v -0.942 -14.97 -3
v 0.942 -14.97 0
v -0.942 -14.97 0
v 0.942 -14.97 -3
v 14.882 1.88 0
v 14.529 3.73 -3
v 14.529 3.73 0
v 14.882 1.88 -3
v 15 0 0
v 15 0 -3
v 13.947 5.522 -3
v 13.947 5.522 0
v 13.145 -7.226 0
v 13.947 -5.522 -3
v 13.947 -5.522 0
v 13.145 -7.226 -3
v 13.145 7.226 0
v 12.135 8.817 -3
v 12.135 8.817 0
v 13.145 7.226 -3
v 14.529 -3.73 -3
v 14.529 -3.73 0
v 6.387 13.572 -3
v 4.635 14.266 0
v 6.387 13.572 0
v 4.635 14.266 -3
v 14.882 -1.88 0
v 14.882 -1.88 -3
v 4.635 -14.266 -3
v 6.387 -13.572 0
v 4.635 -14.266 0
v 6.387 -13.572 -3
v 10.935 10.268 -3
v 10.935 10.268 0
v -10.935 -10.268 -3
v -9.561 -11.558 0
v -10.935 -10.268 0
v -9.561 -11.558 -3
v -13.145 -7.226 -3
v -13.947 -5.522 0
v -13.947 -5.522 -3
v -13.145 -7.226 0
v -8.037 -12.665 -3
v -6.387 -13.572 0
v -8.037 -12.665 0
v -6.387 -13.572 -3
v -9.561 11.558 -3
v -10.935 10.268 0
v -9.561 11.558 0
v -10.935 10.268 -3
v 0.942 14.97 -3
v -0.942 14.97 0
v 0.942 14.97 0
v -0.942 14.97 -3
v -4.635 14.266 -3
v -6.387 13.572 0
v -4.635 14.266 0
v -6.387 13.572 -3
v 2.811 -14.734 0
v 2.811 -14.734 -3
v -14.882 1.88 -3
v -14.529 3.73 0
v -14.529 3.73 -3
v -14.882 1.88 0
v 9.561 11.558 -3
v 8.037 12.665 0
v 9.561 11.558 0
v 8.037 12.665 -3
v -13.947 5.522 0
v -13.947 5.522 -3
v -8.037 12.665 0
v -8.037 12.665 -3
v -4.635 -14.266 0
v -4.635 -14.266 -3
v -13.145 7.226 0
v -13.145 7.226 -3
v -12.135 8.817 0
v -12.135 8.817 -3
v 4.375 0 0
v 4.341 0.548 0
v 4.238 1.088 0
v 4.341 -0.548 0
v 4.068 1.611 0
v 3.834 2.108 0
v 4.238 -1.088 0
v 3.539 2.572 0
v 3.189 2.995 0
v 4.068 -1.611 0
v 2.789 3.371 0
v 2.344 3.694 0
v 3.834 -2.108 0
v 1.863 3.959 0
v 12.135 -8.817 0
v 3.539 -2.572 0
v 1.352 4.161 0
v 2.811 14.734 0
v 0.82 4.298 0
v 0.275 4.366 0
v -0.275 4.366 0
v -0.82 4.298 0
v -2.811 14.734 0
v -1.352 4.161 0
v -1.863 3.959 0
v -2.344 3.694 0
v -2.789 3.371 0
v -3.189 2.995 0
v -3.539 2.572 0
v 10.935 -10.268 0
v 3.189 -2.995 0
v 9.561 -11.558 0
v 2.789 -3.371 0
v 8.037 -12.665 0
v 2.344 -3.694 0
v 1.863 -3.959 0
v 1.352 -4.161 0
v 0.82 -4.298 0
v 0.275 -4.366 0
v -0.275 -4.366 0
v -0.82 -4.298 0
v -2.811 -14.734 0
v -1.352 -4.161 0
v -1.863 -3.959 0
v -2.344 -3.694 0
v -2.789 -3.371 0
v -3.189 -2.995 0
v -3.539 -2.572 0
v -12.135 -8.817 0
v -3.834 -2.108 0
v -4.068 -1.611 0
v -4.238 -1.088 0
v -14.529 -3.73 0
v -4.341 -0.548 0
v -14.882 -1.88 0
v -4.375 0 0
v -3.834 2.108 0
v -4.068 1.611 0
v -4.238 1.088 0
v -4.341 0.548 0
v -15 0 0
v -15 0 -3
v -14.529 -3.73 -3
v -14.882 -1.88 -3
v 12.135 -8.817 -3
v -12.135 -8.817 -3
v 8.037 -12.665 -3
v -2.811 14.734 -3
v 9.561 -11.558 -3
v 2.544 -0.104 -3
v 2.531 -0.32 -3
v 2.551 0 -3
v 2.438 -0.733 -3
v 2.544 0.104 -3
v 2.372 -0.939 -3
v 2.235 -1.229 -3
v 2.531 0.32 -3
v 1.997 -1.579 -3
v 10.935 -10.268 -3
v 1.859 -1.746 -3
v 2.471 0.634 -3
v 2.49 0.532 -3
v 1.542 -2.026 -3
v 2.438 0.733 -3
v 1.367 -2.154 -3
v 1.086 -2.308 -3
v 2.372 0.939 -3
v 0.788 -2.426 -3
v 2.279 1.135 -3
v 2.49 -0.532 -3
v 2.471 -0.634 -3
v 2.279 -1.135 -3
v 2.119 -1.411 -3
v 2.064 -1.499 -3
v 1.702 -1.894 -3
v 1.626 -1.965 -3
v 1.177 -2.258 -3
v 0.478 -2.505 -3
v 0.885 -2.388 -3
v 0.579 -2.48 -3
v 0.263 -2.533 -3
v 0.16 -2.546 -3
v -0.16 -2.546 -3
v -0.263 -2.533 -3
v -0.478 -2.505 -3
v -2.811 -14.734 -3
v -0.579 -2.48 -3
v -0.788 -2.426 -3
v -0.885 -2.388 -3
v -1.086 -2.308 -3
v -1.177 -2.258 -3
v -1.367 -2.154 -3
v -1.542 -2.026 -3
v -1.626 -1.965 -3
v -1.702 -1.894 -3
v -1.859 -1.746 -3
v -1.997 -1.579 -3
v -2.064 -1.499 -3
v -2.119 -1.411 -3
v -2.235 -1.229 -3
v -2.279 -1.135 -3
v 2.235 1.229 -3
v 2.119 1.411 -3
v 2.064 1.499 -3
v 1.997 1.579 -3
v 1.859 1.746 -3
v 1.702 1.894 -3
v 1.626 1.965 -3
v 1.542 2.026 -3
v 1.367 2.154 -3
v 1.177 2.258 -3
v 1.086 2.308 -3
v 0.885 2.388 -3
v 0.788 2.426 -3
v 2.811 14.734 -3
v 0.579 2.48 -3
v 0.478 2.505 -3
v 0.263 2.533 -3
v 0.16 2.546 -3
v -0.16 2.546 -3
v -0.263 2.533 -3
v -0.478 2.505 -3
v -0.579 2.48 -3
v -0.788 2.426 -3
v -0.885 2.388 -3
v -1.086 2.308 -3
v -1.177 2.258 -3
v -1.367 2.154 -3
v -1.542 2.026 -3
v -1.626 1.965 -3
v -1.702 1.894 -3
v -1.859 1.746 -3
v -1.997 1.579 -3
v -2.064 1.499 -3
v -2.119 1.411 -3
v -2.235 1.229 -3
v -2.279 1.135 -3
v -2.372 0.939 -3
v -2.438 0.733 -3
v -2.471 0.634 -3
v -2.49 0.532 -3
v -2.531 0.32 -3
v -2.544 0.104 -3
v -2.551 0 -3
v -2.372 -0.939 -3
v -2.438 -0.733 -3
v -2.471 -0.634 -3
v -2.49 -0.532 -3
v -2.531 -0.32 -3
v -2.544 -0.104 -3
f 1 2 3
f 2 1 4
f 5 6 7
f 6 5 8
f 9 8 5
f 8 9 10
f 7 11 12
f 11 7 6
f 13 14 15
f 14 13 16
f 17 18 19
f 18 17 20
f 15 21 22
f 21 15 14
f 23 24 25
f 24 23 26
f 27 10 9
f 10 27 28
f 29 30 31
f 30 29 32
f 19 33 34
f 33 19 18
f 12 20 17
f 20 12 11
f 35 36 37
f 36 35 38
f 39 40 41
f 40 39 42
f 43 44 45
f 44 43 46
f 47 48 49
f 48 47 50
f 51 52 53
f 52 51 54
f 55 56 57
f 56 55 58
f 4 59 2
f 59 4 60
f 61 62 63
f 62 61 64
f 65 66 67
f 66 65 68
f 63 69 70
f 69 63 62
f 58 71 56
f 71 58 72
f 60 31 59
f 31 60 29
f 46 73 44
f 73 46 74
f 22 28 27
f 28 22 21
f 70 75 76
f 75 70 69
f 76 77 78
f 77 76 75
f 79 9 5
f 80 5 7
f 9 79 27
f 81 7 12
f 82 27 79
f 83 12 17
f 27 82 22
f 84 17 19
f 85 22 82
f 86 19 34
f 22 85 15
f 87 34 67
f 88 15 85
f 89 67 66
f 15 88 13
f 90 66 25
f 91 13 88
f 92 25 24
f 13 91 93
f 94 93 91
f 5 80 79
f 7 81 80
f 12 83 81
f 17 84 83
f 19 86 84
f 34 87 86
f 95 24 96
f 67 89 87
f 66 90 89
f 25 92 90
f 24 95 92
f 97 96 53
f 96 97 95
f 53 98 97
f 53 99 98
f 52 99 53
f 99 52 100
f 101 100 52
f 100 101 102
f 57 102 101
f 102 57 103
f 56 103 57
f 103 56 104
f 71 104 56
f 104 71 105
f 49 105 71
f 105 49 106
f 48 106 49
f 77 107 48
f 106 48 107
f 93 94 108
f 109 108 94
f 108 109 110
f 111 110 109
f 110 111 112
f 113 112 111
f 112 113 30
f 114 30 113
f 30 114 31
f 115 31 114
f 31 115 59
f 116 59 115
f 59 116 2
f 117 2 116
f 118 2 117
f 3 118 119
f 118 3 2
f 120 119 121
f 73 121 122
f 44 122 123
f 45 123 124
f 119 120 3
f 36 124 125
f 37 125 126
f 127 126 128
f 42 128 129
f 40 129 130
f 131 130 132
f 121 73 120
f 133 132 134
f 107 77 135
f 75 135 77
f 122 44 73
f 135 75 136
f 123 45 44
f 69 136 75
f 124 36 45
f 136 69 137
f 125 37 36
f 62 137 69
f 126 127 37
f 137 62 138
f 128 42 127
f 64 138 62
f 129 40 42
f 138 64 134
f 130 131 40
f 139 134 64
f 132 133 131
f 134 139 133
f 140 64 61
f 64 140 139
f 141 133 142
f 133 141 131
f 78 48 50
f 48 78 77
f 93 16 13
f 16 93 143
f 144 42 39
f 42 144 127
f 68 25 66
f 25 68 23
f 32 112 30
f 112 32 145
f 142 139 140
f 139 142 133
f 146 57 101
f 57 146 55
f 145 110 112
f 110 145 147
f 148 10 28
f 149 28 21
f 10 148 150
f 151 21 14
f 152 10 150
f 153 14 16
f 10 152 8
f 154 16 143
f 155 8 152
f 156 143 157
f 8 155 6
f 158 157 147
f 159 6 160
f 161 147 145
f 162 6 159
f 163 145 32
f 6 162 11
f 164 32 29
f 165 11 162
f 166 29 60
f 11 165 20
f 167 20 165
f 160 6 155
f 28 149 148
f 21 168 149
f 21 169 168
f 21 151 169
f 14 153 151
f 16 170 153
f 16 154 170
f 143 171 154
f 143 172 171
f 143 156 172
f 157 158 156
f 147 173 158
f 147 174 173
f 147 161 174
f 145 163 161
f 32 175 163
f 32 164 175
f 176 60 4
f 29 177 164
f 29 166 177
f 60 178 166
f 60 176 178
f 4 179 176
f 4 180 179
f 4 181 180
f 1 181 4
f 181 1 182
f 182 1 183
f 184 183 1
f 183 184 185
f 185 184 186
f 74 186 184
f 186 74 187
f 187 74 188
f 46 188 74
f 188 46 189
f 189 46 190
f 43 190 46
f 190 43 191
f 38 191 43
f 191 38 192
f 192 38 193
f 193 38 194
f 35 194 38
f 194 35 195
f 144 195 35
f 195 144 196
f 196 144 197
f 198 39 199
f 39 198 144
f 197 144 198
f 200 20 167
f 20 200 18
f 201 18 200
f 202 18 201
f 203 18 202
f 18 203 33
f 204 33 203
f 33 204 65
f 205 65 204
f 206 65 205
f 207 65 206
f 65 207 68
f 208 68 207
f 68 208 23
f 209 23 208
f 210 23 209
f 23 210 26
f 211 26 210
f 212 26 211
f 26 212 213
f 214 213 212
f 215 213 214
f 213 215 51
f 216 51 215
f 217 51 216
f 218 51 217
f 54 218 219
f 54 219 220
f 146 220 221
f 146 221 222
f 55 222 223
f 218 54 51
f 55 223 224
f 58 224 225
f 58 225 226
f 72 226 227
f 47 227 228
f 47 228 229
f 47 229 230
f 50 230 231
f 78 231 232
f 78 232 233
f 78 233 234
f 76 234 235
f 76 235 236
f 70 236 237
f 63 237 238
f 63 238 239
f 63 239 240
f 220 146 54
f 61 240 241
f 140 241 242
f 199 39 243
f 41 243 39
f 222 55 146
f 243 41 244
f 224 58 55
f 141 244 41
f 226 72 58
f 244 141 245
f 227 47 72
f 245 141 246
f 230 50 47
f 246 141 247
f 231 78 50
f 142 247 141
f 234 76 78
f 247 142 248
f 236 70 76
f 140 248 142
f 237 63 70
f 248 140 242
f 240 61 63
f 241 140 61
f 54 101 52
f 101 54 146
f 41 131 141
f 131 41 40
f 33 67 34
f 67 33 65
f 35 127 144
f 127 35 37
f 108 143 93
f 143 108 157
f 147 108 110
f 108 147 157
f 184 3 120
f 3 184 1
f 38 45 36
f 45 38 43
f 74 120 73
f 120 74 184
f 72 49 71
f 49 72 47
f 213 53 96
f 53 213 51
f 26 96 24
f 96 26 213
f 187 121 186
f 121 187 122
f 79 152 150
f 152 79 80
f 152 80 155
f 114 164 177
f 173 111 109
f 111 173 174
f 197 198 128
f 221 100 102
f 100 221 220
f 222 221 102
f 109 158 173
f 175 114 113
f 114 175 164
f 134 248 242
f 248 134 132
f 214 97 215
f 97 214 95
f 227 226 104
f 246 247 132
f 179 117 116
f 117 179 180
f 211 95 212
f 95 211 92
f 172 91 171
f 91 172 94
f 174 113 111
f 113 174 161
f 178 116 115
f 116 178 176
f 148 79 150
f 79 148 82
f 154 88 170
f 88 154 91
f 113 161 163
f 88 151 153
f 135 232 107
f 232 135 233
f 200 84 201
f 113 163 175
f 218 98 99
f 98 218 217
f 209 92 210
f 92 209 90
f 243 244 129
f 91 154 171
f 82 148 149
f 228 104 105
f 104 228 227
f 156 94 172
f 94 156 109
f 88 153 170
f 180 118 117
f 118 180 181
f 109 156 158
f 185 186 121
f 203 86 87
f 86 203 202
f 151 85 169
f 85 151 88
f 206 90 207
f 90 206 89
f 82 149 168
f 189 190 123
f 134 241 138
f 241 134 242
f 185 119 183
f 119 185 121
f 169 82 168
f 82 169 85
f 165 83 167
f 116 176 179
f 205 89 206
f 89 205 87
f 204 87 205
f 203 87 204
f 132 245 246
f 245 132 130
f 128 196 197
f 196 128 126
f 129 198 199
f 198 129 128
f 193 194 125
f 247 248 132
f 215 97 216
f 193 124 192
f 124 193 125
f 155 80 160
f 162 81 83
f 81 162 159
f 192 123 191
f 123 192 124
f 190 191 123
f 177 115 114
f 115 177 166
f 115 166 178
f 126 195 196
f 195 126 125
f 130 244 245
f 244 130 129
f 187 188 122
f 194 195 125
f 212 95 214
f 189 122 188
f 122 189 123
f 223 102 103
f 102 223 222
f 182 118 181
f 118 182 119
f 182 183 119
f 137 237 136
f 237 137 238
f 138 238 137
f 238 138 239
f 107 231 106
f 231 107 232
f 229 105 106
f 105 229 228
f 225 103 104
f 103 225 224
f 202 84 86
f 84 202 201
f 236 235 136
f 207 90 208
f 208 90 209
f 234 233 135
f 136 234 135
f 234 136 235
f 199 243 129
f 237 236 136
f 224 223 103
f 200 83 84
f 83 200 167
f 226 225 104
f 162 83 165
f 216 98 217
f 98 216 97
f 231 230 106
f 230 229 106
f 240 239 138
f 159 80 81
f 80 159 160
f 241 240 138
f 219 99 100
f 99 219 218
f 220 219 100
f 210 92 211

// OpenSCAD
$fn = 50;


difference() {
	union() {
		translate(v = [0, 0, -3.0000000000]) {
			cylinder(h = 3, r = 15.0000000000);
		}
		translate(v = [0, 0, -3.0000000000]) {
			cylinder(h = 3, r = 2.8750000000);
		}
	}
	union() {
		translate(v = [0, 0, 0]) {
			rotate(a = [0, 0, 0]) {
				difference() {
					union() {
						translate(v = [0, 0, -3.0000000000]) {
							cylinder(h = 3, r = 2.0000000000);
						}
						translate(v = [0, 0, -3.7000000000]) {
							cylinder(h = 3.7000000000, r1 = 2.1250000000, r2 = 4.3750000000);
						}
						translate(v = [0, 0, -3.0000000000]) {
							cylinder(h = 3, r = 2.1250000000);
						}
						translate(v = [0, 0, -3.0000000000]) {
							cylinder(h = 3, r = 2.0000000000);
						}
					}
					union();
				}
			}
		}
	}
}
